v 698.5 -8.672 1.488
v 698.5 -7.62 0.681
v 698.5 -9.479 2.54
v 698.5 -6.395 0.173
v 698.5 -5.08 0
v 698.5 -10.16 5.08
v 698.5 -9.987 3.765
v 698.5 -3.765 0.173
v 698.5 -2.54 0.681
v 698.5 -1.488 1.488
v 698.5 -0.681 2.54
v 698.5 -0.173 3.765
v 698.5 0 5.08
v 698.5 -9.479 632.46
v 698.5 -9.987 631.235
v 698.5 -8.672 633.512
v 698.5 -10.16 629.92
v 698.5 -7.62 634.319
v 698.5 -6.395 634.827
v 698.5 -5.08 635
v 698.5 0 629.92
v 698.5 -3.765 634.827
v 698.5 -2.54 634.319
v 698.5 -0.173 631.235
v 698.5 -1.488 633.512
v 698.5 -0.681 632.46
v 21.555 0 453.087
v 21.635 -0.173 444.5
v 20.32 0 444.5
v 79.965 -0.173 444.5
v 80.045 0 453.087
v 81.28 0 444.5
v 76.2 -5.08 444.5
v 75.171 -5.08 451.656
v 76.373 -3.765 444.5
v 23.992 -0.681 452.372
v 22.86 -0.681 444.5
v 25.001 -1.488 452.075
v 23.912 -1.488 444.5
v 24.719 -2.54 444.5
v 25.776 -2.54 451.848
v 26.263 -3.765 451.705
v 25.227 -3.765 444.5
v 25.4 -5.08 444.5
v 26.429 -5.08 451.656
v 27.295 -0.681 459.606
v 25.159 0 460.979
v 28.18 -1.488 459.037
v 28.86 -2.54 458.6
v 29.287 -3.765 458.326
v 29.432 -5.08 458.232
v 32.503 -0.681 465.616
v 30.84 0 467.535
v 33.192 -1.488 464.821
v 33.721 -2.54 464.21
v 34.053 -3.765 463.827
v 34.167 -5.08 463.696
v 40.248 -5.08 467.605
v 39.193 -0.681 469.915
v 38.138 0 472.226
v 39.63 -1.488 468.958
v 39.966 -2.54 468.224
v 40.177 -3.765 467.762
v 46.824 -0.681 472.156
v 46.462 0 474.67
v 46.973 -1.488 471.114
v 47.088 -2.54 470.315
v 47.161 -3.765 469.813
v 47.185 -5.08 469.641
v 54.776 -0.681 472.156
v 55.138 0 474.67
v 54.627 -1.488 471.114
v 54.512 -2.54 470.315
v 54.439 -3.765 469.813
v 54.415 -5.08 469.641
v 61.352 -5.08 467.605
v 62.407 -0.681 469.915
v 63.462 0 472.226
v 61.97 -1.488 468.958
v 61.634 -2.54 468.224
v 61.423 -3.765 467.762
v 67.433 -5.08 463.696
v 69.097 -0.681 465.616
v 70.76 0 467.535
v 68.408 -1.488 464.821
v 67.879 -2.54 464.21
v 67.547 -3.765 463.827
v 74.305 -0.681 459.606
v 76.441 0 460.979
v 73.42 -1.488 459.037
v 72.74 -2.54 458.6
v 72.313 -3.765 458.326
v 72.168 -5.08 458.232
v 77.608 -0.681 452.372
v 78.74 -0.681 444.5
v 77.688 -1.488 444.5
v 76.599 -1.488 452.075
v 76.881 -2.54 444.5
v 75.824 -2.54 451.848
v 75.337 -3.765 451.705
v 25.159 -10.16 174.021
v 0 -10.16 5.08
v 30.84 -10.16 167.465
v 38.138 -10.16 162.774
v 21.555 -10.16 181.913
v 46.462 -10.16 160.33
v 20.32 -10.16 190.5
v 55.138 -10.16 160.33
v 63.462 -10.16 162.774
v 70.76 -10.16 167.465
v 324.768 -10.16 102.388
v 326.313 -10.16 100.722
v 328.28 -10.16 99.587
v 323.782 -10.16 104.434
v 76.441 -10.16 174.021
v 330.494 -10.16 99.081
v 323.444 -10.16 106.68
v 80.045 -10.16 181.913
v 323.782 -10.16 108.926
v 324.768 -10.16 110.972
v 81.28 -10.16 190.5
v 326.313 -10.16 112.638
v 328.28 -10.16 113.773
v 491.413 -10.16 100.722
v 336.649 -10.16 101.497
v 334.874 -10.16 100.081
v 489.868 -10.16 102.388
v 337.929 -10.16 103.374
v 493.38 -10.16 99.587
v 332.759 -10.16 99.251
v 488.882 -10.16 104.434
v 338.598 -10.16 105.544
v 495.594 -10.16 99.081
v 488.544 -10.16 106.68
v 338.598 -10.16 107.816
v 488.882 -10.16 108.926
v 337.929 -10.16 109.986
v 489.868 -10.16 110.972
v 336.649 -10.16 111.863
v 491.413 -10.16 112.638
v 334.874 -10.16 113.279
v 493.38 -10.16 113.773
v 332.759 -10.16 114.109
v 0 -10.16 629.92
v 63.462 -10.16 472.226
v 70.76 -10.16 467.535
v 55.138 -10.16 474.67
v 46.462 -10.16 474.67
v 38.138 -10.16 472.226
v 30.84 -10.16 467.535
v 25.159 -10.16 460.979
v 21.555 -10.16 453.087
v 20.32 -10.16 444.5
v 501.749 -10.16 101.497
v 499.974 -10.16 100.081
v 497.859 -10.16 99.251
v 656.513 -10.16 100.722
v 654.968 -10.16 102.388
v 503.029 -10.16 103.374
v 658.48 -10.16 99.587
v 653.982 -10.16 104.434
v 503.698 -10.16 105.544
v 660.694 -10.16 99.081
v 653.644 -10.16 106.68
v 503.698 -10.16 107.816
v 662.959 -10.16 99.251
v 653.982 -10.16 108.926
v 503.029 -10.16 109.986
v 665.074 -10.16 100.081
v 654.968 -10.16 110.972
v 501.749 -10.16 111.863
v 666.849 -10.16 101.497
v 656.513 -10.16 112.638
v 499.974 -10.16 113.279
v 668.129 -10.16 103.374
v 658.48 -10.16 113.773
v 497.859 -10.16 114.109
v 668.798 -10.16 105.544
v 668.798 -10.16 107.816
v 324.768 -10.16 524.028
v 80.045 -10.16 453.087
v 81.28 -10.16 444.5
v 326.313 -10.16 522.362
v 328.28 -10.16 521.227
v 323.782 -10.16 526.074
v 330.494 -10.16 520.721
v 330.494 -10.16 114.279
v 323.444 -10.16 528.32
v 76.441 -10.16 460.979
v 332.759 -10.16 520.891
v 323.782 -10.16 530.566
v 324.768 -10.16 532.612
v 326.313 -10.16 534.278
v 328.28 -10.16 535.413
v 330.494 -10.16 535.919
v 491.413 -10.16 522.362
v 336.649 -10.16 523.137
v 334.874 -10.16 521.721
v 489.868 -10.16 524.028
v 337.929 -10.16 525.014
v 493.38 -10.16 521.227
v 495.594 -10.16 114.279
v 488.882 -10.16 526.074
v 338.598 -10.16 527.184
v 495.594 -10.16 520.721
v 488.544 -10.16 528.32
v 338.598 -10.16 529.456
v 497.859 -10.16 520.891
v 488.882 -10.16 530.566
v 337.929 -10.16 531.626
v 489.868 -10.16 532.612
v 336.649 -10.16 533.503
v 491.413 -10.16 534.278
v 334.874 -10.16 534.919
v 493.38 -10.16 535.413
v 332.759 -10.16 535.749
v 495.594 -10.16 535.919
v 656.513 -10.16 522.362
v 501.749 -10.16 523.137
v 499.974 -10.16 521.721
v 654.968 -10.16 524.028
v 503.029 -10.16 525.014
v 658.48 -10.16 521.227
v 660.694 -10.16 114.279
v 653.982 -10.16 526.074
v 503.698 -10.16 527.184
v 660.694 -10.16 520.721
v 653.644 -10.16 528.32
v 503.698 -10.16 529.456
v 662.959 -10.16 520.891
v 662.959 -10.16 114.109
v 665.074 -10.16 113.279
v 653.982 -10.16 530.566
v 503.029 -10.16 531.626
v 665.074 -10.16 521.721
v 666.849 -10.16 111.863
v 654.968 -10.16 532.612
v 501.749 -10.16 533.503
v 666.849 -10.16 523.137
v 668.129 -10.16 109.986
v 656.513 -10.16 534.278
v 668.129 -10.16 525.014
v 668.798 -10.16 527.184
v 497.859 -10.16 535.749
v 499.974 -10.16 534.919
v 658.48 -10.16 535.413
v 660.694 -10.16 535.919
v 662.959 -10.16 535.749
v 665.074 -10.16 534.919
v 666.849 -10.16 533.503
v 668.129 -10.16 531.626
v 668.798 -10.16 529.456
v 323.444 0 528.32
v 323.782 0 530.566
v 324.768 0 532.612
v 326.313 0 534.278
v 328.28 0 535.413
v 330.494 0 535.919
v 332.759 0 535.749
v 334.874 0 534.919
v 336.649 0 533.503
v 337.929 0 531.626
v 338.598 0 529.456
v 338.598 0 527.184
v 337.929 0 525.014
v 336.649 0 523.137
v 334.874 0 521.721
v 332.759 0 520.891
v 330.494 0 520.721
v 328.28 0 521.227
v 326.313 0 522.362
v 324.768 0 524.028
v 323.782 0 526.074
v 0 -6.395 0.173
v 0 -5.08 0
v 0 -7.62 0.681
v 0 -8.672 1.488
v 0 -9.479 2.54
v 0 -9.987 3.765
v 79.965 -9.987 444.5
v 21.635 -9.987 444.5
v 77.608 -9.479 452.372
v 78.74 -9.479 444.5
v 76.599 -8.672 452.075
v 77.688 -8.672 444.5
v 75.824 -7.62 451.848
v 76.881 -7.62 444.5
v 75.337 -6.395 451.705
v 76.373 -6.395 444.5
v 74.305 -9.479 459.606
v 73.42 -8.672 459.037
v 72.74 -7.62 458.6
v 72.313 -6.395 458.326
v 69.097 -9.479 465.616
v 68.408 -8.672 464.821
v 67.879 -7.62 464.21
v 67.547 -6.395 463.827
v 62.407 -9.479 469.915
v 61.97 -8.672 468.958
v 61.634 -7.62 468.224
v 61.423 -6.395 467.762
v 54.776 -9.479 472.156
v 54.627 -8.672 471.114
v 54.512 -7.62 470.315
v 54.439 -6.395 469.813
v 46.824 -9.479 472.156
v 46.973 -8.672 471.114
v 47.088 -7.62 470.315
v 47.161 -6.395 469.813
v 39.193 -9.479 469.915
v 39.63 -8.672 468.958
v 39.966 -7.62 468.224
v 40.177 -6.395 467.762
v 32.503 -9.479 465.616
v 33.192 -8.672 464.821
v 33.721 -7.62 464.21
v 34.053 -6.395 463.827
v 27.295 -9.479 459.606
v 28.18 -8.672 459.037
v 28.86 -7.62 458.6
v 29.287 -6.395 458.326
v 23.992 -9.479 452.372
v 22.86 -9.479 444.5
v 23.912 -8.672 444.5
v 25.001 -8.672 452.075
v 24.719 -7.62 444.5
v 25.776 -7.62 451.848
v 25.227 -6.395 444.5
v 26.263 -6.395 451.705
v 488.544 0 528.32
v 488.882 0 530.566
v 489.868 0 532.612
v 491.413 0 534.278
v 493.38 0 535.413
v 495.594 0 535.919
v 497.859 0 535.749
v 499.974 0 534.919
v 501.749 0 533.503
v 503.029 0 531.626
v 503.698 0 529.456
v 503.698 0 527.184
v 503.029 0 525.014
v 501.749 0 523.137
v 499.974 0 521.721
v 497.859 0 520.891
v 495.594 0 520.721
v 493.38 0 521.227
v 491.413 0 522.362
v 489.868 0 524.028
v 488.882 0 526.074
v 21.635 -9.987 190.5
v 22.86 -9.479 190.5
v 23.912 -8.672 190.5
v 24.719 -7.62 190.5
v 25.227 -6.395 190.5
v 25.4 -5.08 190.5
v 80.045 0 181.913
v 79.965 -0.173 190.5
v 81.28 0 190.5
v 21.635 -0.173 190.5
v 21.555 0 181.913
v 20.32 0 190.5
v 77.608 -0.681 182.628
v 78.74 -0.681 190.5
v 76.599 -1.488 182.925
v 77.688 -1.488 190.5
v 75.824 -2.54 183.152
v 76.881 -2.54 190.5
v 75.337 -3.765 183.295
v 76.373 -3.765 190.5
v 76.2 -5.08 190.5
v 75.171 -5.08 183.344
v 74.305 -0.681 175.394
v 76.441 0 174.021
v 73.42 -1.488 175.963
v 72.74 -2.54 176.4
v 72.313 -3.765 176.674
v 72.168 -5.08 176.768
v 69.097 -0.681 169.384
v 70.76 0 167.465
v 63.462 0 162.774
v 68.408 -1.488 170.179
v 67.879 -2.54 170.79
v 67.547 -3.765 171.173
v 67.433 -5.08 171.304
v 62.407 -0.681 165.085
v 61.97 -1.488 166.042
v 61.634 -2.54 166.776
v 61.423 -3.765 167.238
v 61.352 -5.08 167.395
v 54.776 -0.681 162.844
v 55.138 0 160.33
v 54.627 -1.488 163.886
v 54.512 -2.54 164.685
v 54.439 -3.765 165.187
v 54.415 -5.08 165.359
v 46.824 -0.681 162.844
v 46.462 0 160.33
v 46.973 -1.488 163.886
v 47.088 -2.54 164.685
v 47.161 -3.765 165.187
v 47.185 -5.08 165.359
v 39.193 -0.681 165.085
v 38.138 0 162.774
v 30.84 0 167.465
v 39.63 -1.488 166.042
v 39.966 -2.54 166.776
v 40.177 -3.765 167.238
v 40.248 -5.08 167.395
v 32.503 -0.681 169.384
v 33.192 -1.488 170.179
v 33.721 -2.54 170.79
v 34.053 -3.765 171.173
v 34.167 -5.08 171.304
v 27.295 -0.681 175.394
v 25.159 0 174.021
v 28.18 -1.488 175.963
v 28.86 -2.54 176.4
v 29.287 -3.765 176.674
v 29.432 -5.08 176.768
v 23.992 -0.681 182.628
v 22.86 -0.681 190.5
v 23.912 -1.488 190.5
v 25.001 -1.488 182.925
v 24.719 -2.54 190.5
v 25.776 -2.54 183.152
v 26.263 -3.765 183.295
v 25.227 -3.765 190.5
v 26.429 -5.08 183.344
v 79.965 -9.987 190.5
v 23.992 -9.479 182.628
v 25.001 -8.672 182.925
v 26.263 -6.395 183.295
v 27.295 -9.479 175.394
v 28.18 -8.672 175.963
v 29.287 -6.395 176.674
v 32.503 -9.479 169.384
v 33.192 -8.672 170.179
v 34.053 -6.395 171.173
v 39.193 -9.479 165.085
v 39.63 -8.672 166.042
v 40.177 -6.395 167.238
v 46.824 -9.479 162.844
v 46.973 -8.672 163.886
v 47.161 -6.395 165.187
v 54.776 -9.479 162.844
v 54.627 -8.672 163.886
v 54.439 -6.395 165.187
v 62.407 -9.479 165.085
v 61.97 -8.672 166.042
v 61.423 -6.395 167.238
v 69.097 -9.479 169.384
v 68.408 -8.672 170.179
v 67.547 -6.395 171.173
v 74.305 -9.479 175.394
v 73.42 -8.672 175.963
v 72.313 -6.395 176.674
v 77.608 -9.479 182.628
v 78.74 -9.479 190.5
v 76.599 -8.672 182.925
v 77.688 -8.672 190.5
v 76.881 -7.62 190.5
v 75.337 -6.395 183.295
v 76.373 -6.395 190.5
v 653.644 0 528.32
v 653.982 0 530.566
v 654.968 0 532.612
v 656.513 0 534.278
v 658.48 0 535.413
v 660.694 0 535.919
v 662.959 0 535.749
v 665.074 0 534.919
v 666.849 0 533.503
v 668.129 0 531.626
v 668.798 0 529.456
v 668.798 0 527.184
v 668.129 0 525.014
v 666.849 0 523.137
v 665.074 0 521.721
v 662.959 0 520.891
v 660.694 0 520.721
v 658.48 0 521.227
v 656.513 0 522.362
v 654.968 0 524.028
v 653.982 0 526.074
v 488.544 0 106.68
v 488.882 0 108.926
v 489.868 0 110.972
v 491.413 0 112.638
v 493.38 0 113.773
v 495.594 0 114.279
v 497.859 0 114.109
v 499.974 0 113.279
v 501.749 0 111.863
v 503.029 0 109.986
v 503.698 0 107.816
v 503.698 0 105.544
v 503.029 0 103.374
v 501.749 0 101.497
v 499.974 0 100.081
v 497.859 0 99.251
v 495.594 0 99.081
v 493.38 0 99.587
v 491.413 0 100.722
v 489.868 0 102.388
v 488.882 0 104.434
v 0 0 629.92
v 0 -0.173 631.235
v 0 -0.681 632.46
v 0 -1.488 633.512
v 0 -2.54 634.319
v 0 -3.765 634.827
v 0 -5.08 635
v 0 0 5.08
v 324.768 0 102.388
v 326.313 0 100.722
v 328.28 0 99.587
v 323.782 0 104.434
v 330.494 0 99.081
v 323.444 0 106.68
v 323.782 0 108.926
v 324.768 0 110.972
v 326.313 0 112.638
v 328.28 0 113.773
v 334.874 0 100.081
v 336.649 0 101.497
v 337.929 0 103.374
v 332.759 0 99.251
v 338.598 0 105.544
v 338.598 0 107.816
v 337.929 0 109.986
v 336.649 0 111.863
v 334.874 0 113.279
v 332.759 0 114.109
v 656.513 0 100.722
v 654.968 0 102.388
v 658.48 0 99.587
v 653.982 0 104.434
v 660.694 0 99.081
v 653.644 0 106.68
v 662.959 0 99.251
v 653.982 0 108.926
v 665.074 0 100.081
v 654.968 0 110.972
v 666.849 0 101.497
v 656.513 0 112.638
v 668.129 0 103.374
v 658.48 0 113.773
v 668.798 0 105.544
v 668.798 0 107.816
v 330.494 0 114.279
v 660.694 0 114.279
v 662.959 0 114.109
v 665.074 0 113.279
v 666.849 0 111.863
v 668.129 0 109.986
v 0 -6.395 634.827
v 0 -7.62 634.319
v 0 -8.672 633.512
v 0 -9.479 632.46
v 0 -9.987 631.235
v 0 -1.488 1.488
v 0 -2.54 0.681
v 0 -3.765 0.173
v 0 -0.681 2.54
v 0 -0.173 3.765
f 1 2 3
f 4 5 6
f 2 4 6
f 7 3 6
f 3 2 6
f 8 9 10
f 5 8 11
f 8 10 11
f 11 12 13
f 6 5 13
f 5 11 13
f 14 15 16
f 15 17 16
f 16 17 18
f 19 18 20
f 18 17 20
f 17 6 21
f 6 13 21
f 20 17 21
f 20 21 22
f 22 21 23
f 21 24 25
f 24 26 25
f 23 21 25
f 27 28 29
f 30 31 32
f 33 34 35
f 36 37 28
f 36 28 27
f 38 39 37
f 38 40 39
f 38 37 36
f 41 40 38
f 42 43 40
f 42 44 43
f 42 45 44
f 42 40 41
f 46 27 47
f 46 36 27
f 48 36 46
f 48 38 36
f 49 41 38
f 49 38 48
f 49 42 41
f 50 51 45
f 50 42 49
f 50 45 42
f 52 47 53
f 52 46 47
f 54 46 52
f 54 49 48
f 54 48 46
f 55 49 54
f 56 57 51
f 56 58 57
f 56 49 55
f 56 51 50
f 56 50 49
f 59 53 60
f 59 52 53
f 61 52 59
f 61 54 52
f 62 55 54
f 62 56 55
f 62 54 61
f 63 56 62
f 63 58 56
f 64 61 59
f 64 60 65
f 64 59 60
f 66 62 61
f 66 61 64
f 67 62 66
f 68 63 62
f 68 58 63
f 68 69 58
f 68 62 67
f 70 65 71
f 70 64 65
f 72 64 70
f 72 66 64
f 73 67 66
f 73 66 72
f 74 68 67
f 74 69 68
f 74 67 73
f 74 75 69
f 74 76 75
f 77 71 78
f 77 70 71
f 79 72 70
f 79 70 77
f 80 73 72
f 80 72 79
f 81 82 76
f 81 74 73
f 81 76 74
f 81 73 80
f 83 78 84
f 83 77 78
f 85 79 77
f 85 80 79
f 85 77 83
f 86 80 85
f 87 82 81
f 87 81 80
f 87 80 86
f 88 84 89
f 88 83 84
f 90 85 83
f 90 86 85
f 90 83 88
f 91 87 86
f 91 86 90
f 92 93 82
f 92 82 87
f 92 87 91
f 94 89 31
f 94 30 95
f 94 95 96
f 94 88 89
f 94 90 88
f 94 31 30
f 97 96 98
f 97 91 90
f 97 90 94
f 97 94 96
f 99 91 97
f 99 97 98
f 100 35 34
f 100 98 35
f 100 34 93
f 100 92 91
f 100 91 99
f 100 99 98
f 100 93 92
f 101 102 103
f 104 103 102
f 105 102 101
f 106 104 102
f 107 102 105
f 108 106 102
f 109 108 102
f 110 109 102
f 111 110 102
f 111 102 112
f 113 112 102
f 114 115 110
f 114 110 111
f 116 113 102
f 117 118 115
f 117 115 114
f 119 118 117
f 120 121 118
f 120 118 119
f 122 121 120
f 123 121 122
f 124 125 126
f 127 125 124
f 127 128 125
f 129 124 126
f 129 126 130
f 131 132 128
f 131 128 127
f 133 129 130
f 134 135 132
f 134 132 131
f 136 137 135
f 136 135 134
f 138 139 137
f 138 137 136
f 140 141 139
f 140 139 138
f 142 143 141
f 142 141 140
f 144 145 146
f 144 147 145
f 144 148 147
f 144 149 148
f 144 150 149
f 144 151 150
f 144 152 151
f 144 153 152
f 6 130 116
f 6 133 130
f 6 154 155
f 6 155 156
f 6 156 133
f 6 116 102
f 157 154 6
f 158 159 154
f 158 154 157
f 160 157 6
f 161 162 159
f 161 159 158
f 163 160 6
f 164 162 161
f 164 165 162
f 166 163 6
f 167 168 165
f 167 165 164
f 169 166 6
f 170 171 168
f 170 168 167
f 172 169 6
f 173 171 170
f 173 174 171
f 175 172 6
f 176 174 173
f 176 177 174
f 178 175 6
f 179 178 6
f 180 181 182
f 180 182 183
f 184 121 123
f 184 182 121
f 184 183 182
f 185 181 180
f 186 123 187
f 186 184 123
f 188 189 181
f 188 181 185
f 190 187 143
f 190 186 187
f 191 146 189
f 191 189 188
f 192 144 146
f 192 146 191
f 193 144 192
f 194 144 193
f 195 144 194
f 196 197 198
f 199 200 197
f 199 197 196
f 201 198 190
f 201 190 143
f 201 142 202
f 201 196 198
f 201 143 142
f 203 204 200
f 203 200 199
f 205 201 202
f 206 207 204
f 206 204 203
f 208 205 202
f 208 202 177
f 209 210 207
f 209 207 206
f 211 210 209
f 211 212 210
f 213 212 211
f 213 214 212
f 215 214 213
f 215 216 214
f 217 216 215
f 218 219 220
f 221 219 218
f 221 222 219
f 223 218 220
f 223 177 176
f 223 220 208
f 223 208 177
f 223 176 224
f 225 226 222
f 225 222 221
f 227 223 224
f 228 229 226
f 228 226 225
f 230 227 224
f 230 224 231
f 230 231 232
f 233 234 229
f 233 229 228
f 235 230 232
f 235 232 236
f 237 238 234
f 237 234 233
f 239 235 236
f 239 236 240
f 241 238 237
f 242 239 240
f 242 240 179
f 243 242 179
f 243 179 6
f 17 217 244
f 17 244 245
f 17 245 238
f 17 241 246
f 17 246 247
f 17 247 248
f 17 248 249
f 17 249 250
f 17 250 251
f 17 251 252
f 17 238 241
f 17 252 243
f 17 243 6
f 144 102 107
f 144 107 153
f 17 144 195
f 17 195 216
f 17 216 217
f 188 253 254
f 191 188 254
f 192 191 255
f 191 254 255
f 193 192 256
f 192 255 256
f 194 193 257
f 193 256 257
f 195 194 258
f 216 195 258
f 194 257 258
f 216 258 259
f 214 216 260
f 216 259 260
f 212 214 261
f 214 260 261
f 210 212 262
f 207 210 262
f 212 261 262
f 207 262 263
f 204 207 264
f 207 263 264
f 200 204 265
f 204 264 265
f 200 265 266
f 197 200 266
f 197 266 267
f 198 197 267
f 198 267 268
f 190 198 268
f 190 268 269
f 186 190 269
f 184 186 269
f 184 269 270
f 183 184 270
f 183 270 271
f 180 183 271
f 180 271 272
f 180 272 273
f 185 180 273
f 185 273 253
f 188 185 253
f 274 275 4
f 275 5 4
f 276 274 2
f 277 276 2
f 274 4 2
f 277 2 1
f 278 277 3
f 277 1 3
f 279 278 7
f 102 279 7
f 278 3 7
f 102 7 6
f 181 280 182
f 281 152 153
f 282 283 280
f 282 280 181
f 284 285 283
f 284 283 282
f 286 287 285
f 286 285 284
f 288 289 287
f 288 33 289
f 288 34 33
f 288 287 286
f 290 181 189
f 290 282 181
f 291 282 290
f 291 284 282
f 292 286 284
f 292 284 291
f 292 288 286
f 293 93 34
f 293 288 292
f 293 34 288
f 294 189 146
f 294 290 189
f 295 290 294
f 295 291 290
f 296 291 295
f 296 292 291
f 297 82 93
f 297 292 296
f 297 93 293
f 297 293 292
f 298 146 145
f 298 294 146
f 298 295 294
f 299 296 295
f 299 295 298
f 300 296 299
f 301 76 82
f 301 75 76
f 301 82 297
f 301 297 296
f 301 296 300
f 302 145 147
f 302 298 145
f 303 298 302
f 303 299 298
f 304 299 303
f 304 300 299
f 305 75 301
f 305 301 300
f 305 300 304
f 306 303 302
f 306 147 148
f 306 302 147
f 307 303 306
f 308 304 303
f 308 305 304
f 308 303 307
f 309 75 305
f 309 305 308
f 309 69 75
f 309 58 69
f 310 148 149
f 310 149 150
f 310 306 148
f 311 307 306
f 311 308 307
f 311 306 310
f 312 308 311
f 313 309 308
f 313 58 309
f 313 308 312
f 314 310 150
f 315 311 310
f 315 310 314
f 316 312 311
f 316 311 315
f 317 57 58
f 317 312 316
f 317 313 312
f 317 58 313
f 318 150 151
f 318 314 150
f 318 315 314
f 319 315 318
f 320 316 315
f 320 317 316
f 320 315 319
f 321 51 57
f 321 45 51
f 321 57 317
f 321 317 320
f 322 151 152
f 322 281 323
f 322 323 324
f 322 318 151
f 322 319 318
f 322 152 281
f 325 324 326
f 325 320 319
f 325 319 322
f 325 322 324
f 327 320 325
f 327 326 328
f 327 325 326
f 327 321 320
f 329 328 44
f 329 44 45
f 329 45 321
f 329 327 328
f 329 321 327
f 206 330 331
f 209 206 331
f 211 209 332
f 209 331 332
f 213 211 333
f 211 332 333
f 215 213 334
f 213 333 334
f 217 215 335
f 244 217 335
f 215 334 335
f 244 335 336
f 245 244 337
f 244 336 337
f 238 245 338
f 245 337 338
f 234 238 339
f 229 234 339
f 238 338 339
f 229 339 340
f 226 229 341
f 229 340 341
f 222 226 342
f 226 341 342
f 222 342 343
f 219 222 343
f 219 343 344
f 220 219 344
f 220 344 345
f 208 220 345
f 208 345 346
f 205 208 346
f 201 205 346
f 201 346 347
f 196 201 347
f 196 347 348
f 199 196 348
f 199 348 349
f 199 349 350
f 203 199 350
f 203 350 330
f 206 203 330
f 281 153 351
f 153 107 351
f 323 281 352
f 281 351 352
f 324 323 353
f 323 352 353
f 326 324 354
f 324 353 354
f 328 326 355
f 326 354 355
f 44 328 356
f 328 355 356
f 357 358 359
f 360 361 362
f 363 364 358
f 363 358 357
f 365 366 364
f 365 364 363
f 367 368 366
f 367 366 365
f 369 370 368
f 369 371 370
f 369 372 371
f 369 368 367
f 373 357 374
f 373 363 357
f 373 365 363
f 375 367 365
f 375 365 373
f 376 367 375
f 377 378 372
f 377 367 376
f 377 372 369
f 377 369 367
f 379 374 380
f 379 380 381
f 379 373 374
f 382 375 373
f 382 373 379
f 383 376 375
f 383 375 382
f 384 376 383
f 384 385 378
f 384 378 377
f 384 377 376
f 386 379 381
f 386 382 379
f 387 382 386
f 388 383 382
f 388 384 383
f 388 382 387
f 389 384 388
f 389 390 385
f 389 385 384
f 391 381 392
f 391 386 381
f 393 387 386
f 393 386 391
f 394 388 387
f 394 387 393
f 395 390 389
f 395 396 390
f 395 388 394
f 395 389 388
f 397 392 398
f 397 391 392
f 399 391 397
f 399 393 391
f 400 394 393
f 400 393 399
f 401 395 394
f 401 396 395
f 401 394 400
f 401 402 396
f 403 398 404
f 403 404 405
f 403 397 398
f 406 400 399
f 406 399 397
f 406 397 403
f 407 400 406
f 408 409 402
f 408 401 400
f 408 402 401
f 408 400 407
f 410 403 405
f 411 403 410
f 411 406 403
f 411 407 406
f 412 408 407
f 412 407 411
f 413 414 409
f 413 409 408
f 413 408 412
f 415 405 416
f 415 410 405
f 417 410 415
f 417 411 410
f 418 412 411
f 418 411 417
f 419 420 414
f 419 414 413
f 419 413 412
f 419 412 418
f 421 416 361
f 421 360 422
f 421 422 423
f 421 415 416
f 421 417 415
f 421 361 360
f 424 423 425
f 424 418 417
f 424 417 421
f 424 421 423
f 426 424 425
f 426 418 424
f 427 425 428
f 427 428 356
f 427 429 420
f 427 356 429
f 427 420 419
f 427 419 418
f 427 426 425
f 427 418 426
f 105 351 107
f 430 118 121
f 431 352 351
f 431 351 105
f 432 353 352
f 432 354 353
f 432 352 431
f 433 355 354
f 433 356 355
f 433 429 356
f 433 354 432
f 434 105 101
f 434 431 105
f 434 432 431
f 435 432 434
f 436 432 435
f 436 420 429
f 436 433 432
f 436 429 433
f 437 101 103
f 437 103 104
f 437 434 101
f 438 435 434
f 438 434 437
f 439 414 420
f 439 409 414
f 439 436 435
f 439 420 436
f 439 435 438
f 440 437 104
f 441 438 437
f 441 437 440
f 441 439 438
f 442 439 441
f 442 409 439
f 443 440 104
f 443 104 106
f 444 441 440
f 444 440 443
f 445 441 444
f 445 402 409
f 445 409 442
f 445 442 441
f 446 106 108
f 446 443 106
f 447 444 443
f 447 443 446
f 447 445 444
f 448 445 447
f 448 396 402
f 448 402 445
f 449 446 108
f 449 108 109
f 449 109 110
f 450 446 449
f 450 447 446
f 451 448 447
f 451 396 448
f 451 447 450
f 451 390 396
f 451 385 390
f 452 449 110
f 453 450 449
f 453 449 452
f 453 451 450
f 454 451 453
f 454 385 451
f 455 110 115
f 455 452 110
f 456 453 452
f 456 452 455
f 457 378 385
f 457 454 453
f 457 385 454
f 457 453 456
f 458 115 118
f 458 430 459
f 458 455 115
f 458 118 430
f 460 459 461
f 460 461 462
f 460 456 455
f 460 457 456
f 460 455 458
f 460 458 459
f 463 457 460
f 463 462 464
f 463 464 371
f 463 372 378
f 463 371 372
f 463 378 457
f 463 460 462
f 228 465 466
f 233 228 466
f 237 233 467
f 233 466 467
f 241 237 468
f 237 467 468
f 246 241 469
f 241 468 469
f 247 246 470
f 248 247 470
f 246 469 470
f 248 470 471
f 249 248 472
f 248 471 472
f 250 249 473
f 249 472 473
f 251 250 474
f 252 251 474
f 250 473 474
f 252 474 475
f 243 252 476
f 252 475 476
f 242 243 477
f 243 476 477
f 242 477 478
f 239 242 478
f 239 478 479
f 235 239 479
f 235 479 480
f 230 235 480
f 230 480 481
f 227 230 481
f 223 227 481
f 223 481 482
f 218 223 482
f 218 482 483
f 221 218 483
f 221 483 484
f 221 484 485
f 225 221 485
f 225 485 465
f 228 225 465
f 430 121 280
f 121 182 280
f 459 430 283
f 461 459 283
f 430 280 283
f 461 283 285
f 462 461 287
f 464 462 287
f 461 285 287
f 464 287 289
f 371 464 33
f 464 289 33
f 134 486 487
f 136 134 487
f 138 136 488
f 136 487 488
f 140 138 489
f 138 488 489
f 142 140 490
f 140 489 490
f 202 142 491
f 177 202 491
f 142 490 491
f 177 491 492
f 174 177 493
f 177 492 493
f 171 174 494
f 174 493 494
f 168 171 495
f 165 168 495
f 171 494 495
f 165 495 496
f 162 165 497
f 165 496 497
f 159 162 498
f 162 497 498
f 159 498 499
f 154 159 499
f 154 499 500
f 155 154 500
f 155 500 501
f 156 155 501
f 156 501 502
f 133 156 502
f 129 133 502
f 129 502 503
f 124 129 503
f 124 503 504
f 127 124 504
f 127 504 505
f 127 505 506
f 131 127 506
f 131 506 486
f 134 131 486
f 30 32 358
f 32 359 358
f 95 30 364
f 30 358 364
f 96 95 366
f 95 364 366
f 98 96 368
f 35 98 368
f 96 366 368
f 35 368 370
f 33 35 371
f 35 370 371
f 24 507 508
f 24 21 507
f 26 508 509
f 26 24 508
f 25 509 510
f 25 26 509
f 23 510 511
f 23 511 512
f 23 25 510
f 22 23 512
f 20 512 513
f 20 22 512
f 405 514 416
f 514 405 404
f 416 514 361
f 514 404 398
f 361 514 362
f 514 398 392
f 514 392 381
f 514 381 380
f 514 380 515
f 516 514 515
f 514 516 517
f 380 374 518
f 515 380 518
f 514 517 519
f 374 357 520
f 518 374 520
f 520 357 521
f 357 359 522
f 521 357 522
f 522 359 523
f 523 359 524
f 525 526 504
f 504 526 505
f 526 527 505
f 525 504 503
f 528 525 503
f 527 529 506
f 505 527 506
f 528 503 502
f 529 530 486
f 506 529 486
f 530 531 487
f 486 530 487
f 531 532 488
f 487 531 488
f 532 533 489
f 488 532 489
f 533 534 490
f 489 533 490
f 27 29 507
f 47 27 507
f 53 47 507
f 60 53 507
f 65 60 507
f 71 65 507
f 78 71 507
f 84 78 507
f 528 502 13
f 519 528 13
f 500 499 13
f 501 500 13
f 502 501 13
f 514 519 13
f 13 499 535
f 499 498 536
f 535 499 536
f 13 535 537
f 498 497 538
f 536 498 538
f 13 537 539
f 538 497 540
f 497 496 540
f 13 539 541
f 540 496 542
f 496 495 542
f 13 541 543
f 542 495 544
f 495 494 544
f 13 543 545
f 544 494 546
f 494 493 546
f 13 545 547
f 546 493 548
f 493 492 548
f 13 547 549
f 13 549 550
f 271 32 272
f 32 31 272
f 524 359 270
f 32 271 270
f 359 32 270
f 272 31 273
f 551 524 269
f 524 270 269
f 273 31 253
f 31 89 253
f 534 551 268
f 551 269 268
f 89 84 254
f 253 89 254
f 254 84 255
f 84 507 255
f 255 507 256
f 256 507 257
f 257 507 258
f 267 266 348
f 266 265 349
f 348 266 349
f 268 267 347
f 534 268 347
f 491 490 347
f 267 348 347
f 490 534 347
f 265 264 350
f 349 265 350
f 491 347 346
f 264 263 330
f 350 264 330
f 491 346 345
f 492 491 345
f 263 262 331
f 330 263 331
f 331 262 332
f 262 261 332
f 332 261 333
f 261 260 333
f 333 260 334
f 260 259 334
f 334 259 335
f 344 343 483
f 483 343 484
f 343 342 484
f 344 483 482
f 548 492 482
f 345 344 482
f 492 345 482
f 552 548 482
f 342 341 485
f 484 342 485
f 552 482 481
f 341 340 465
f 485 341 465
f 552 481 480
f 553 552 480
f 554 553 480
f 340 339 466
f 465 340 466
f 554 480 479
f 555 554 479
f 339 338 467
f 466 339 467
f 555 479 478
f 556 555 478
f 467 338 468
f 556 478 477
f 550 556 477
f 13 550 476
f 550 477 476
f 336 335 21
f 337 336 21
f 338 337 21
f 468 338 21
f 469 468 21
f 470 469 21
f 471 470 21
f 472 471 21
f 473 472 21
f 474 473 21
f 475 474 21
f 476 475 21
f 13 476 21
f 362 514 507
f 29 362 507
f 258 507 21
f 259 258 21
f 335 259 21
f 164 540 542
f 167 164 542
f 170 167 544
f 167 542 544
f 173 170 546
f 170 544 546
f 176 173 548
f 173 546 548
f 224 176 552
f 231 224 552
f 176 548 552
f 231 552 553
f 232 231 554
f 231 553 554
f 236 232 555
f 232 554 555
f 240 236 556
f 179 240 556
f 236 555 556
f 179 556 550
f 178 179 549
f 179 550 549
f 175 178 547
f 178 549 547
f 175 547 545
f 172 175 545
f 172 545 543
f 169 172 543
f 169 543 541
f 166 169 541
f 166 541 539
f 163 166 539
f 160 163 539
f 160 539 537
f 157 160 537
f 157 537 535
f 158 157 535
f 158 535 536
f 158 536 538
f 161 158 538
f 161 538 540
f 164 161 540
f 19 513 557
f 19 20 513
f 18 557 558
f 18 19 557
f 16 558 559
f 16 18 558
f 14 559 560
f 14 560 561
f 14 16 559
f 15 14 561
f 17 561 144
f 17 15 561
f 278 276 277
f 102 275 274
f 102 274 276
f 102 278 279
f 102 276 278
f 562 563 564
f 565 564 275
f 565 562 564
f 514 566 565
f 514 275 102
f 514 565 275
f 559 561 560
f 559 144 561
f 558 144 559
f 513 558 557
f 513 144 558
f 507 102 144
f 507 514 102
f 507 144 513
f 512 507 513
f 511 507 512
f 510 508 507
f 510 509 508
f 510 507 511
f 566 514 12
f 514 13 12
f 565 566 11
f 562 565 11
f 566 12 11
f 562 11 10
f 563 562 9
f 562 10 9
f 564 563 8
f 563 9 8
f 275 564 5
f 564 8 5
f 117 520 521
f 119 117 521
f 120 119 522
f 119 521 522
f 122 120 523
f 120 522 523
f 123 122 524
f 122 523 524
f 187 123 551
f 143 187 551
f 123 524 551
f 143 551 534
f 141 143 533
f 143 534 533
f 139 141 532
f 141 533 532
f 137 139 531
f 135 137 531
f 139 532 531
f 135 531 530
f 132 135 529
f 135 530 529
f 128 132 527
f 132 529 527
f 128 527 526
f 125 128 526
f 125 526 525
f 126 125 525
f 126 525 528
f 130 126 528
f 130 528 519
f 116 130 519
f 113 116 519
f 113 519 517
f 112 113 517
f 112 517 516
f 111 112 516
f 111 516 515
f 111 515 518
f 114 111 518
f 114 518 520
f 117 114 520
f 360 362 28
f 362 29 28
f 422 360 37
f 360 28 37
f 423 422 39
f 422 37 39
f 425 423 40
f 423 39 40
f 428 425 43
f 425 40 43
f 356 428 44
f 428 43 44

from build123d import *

# Parameters (mm, degrees)
F0_W     = 698.5
F0_H     = 635
F1_DEPTH = 10.16
F4_DEPTH = 10.161
F5_R     = 5.07999
F6_R     = 5.07999
F8_D     = 15.24


# Not quite as in the source:
# - a fillet or chamfer is up to 0.001 mm smaller than in the source, because OpenCascade refuses the exact size


with BuildPart() as f1:
    # F0 (on Front) → F1 (new body)
    with BuildSketch(Plane.XZ):
        with Locations((349.25, 317.5)):
            Rectangle(F0_W, F0_H)
    extrude(amount=F1_DEPTH)

    # F3 (on face) → F4 (cut, through all)
    with BuildSketch(Plane(origin=(0, 0, 0), x_dir=(-1, 0, 0), z_dir=(0, 1, 0))):
        with BuildLine():
            Line((-25.4, 190.5), (-25.4, 444.5))
            ThreePointArc((-25.4, 444.5), (-50.8, 469.9), (-76.2, 444.5))
            Line((-76.2, 444.5), (-76.2, 190.5))
            ThreePointArc((-76.2, 190.5), (-50.8, 165.1), (-25.4, 190.5))
        make_face()
    extrude(amount=-F4_DEPTH, mode=Mode.SUBTRACT)

    # F5 (radius 5.08 in the source; OpenCascade refuses exactly that, so slightly less here)
    f5_edges = [f1.edges().sort_by_distance(p)[0] for p in [
        (50.8, 0, 165.1),
        (76.2, -10.16, 317.5),
    ]]
    fillet(f5_edges, radius=F5_R)

    # F6 (radius 5.08 in the source; OpenCascade refuses exactly that, so slightly less here)
    f6_edges = [f1.edges().sort_by_distance(p)[0] for p in [
        (349.25, -10.16, 635),
        (349.25, 0, 635),
        (349.25, -10.16, 0),
        (349.25, 0, 0),
    ]]
    fillet(f6_edges, radius=F6_R)

    # F8 (through all)
    with Locations(Plane.XZ.offset(10.16)):
        with Locations((496.1636, 528.32), (331.0636, 528.32), (661.2636, 528.32), (661.2636, 106.68), (496.1636, 106.68), (331.0636, 106.68)):
            Hole(F8_D / 2)


solid = f1.part
